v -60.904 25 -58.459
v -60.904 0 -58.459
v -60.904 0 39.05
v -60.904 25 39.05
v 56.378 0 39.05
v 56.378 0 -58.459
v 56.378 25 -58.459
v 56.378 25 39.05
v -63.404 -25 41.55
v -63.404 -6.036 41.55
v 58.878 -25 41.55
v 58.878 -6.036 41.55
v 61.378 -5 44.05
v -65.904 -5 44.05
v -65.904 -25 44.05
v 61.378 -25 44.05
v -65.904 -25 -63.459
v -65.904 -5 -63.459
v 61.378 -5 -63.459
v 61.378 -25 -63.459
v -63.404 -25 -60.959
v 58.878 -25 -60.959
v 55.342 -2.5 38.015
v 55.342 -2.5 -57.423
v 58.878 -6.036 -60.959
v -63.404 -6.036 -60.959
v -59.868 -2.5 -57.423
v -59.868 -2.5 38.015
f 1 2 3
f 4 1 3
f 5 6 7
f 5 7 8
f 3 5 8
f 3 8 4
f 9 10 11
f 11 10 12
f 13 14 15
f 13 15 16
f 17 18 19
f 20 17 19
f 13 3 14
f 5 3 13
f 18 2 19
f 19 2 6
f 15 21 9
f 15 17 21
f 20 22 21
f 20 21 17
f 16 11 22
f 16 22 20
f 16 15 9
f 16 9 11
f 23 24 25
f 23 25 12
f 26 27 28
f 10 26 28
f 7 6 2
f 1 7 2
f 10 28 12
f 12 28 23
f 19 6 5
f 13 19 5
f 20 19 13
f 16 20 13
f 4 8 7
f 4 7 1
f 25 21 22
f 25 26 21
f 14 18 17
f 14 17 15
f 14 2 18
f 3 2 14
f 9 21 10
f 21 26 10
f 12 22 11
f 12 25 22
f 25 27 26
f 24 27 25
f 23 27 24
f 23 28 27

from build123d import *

# Parameters (mm, degrees)
F0_W     = 127.2814720869
F0_H     = 107.5093485415
F1_DEPTH = 25
F2_SIZE  = 5
F3_T     = -2.5
F4_W     = 117.2814720869
F4_H     = 97.5093485415
F5_DEPTH = 25


with BuildPart() as f1:
    # F0 (on Front) → F1 (new body)
    with BuildSketch(Plane.XZ):
        with Locations((-2.2627860308, -9.7043421119)):
            Rectangle(F0_W, F0_H)
    extrude(amount=F1_DEPTH)

    # F2
    f2_edges = [f1.edges().sort_by_distance(p)[0] for p in [
        (61.37795, 0, -9.704342),
        (-2.262786, 0, -63.459016),
        (-65.903522, 0, -9.704342),
        (-2.262786, 0, 44.050332),
    ]]
    chamfer(f2_edges, length=F2_SIZE)

    # F3
    f3_openings = [f1.faces().sort_by_distance(p)[0] for p in [
        (-2.262786, -25, -9.704342),
    ]]
    offset(amount=F3_T, openings=f3_openings)

    # F4 (on face) → F5 (join)
    with BuildSketch(Plane(origin=(0, 0, 0), x_dir=(-1, 0, 0), z_dir=(0, 1, 0))):
        with Locations((2.2627860308, -9.7043421119)):
            Rectangle(F4_W, F4_H)
    extrude(amount=F5_DEPTH)


solid = f1.part
